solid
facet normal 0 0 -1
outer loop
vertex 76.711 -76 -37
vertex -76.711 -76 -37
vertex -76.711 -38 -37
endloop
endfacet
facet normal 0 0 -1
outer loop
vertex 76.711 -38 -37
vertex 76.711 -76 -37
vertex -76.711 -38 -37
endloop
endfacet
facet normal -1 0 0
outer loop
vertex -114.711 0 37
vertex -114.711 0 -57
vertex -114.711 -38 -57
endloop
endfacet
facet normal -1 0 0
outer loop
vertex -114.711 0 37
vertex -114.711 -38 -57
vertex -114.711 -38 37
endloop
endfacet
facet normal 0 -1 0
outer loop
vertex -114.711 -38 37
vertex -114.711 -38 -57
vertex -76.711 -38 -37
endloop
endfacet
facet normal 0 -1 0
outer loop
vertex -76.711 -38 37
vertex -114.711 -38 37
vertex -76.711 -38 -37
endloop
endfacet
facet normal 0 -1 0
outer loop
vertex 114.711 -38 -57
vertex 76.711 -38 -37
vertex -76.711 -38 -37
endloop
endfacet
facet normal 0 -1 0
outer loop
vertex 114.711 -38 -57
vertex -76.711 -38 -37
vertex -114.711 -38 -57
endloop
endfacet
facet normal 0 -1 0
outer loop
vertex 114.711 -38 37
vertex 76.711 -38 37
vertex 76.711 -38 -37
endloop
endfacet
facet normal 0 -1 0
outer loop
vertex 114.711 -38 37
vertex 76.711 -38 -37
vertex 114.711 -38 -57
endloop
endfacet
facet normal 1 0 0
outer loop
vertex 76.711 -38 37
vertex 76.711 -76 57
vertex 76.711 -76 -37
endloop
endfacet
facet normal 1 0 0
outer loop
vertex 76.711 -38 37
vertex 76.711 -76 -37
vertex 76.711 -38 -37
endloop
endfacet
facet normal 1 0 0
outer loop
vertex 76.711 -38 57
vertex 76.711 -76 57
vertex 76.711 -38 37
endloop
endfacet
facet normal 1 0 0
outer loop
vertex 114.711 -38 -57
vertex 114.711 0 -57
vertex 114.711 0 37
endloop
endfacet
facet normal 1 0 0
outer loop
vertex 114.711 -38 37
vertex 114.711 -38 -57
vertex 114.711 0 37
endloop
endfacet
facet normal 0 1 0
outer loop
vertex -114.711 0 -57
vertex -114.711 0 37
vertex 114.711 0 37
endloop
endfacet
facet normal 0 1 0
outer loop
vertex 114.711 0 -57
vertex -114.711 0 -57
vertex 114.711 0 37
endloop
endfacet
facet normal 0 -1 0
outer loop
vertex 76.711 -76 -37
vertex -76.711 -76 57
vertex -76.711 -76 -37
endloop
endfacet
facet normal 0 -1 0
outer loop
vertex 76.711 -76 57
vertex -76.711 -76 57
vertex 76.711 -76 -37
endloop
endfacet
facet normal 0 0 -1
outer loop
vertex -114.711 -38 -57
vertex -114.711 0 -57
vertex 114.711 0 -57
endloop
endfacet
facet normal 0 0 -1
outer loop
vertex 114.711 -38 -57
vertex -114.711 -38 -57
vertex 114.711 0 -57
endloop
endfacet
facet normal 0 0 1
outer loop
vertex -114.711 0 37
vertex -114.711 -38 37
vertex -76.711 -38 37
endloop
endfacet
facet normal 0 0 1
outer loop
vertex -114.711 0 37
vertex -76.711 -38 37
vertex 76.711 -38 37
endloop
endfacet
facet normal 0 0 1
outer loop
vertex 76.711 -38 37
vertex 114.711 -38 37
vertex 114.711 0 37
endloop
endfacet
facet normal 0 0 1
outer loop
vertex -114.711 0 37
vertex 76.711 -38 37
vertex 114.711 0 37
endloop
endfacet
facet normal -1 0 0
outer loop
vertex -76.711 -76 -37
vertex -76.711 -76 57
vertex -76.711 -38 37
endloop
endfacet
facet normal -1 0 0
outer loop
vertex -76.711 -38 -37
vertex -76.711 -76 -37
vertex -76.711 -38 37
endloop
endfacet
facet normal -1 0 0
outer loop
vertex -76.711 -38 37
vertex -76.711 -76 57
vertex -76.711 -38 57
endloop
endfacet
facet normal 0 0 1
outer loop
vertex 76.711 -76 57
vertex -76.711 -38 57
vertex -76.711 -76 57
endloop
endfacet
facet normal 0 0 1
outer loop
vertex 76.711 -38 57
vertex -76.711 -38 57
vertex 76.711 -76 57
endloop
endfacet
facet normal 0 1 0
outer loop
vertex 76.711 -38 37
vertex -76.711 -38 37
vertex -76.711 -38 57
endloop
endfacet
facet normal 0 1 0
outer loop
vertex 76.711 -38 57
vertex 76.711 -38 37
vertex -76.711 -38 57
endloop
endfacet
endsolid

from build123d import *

# Parameters (mm, degrees)
F0_W     = 229.421454
F0_H     = 114
F1_DEPTH = 76
F3_W     = 38
F3_H     = 20
F4_DEPTH = 229.711727
F6_W     = 38
F6_H     = 38
F7_DEPTH = 114.001


with BuildPart() as f1:
    # F0 (on Front) → F1 (new body)
    with BuildSketch(Plane.XZ):
        Rectangle(F0_W, F0_H)
    extrude(amount=F1_DEPTH)

    # F3 (on offset) → F4 (cut, through all)
    with BuildSketch(Plane.YZ.offset(115)):
        with Locations((-19, 47)):
            Rectangle(F3_W, F3_H)
        with Locations((-57, -47)):
            Rectangle(F3_W, F3_H)
    extrude(amount=-F4_DEPTH, mode=Mode.SUBTRACT)

    # F6 (on offset) → F7 (cut, through all)
    with BuildSketch(Plane.XY.offset(57)):
        with Locations((-95.710727, -57)):
            Rectangle(F6_W, F6_H)
        with Locations((95.710727, -57)):
            Rectangle(F6_W, F6_H)
    extrude(amount=-F7_DEPTH, mode=Mode.SUBTRACT)


solid = f1.part
